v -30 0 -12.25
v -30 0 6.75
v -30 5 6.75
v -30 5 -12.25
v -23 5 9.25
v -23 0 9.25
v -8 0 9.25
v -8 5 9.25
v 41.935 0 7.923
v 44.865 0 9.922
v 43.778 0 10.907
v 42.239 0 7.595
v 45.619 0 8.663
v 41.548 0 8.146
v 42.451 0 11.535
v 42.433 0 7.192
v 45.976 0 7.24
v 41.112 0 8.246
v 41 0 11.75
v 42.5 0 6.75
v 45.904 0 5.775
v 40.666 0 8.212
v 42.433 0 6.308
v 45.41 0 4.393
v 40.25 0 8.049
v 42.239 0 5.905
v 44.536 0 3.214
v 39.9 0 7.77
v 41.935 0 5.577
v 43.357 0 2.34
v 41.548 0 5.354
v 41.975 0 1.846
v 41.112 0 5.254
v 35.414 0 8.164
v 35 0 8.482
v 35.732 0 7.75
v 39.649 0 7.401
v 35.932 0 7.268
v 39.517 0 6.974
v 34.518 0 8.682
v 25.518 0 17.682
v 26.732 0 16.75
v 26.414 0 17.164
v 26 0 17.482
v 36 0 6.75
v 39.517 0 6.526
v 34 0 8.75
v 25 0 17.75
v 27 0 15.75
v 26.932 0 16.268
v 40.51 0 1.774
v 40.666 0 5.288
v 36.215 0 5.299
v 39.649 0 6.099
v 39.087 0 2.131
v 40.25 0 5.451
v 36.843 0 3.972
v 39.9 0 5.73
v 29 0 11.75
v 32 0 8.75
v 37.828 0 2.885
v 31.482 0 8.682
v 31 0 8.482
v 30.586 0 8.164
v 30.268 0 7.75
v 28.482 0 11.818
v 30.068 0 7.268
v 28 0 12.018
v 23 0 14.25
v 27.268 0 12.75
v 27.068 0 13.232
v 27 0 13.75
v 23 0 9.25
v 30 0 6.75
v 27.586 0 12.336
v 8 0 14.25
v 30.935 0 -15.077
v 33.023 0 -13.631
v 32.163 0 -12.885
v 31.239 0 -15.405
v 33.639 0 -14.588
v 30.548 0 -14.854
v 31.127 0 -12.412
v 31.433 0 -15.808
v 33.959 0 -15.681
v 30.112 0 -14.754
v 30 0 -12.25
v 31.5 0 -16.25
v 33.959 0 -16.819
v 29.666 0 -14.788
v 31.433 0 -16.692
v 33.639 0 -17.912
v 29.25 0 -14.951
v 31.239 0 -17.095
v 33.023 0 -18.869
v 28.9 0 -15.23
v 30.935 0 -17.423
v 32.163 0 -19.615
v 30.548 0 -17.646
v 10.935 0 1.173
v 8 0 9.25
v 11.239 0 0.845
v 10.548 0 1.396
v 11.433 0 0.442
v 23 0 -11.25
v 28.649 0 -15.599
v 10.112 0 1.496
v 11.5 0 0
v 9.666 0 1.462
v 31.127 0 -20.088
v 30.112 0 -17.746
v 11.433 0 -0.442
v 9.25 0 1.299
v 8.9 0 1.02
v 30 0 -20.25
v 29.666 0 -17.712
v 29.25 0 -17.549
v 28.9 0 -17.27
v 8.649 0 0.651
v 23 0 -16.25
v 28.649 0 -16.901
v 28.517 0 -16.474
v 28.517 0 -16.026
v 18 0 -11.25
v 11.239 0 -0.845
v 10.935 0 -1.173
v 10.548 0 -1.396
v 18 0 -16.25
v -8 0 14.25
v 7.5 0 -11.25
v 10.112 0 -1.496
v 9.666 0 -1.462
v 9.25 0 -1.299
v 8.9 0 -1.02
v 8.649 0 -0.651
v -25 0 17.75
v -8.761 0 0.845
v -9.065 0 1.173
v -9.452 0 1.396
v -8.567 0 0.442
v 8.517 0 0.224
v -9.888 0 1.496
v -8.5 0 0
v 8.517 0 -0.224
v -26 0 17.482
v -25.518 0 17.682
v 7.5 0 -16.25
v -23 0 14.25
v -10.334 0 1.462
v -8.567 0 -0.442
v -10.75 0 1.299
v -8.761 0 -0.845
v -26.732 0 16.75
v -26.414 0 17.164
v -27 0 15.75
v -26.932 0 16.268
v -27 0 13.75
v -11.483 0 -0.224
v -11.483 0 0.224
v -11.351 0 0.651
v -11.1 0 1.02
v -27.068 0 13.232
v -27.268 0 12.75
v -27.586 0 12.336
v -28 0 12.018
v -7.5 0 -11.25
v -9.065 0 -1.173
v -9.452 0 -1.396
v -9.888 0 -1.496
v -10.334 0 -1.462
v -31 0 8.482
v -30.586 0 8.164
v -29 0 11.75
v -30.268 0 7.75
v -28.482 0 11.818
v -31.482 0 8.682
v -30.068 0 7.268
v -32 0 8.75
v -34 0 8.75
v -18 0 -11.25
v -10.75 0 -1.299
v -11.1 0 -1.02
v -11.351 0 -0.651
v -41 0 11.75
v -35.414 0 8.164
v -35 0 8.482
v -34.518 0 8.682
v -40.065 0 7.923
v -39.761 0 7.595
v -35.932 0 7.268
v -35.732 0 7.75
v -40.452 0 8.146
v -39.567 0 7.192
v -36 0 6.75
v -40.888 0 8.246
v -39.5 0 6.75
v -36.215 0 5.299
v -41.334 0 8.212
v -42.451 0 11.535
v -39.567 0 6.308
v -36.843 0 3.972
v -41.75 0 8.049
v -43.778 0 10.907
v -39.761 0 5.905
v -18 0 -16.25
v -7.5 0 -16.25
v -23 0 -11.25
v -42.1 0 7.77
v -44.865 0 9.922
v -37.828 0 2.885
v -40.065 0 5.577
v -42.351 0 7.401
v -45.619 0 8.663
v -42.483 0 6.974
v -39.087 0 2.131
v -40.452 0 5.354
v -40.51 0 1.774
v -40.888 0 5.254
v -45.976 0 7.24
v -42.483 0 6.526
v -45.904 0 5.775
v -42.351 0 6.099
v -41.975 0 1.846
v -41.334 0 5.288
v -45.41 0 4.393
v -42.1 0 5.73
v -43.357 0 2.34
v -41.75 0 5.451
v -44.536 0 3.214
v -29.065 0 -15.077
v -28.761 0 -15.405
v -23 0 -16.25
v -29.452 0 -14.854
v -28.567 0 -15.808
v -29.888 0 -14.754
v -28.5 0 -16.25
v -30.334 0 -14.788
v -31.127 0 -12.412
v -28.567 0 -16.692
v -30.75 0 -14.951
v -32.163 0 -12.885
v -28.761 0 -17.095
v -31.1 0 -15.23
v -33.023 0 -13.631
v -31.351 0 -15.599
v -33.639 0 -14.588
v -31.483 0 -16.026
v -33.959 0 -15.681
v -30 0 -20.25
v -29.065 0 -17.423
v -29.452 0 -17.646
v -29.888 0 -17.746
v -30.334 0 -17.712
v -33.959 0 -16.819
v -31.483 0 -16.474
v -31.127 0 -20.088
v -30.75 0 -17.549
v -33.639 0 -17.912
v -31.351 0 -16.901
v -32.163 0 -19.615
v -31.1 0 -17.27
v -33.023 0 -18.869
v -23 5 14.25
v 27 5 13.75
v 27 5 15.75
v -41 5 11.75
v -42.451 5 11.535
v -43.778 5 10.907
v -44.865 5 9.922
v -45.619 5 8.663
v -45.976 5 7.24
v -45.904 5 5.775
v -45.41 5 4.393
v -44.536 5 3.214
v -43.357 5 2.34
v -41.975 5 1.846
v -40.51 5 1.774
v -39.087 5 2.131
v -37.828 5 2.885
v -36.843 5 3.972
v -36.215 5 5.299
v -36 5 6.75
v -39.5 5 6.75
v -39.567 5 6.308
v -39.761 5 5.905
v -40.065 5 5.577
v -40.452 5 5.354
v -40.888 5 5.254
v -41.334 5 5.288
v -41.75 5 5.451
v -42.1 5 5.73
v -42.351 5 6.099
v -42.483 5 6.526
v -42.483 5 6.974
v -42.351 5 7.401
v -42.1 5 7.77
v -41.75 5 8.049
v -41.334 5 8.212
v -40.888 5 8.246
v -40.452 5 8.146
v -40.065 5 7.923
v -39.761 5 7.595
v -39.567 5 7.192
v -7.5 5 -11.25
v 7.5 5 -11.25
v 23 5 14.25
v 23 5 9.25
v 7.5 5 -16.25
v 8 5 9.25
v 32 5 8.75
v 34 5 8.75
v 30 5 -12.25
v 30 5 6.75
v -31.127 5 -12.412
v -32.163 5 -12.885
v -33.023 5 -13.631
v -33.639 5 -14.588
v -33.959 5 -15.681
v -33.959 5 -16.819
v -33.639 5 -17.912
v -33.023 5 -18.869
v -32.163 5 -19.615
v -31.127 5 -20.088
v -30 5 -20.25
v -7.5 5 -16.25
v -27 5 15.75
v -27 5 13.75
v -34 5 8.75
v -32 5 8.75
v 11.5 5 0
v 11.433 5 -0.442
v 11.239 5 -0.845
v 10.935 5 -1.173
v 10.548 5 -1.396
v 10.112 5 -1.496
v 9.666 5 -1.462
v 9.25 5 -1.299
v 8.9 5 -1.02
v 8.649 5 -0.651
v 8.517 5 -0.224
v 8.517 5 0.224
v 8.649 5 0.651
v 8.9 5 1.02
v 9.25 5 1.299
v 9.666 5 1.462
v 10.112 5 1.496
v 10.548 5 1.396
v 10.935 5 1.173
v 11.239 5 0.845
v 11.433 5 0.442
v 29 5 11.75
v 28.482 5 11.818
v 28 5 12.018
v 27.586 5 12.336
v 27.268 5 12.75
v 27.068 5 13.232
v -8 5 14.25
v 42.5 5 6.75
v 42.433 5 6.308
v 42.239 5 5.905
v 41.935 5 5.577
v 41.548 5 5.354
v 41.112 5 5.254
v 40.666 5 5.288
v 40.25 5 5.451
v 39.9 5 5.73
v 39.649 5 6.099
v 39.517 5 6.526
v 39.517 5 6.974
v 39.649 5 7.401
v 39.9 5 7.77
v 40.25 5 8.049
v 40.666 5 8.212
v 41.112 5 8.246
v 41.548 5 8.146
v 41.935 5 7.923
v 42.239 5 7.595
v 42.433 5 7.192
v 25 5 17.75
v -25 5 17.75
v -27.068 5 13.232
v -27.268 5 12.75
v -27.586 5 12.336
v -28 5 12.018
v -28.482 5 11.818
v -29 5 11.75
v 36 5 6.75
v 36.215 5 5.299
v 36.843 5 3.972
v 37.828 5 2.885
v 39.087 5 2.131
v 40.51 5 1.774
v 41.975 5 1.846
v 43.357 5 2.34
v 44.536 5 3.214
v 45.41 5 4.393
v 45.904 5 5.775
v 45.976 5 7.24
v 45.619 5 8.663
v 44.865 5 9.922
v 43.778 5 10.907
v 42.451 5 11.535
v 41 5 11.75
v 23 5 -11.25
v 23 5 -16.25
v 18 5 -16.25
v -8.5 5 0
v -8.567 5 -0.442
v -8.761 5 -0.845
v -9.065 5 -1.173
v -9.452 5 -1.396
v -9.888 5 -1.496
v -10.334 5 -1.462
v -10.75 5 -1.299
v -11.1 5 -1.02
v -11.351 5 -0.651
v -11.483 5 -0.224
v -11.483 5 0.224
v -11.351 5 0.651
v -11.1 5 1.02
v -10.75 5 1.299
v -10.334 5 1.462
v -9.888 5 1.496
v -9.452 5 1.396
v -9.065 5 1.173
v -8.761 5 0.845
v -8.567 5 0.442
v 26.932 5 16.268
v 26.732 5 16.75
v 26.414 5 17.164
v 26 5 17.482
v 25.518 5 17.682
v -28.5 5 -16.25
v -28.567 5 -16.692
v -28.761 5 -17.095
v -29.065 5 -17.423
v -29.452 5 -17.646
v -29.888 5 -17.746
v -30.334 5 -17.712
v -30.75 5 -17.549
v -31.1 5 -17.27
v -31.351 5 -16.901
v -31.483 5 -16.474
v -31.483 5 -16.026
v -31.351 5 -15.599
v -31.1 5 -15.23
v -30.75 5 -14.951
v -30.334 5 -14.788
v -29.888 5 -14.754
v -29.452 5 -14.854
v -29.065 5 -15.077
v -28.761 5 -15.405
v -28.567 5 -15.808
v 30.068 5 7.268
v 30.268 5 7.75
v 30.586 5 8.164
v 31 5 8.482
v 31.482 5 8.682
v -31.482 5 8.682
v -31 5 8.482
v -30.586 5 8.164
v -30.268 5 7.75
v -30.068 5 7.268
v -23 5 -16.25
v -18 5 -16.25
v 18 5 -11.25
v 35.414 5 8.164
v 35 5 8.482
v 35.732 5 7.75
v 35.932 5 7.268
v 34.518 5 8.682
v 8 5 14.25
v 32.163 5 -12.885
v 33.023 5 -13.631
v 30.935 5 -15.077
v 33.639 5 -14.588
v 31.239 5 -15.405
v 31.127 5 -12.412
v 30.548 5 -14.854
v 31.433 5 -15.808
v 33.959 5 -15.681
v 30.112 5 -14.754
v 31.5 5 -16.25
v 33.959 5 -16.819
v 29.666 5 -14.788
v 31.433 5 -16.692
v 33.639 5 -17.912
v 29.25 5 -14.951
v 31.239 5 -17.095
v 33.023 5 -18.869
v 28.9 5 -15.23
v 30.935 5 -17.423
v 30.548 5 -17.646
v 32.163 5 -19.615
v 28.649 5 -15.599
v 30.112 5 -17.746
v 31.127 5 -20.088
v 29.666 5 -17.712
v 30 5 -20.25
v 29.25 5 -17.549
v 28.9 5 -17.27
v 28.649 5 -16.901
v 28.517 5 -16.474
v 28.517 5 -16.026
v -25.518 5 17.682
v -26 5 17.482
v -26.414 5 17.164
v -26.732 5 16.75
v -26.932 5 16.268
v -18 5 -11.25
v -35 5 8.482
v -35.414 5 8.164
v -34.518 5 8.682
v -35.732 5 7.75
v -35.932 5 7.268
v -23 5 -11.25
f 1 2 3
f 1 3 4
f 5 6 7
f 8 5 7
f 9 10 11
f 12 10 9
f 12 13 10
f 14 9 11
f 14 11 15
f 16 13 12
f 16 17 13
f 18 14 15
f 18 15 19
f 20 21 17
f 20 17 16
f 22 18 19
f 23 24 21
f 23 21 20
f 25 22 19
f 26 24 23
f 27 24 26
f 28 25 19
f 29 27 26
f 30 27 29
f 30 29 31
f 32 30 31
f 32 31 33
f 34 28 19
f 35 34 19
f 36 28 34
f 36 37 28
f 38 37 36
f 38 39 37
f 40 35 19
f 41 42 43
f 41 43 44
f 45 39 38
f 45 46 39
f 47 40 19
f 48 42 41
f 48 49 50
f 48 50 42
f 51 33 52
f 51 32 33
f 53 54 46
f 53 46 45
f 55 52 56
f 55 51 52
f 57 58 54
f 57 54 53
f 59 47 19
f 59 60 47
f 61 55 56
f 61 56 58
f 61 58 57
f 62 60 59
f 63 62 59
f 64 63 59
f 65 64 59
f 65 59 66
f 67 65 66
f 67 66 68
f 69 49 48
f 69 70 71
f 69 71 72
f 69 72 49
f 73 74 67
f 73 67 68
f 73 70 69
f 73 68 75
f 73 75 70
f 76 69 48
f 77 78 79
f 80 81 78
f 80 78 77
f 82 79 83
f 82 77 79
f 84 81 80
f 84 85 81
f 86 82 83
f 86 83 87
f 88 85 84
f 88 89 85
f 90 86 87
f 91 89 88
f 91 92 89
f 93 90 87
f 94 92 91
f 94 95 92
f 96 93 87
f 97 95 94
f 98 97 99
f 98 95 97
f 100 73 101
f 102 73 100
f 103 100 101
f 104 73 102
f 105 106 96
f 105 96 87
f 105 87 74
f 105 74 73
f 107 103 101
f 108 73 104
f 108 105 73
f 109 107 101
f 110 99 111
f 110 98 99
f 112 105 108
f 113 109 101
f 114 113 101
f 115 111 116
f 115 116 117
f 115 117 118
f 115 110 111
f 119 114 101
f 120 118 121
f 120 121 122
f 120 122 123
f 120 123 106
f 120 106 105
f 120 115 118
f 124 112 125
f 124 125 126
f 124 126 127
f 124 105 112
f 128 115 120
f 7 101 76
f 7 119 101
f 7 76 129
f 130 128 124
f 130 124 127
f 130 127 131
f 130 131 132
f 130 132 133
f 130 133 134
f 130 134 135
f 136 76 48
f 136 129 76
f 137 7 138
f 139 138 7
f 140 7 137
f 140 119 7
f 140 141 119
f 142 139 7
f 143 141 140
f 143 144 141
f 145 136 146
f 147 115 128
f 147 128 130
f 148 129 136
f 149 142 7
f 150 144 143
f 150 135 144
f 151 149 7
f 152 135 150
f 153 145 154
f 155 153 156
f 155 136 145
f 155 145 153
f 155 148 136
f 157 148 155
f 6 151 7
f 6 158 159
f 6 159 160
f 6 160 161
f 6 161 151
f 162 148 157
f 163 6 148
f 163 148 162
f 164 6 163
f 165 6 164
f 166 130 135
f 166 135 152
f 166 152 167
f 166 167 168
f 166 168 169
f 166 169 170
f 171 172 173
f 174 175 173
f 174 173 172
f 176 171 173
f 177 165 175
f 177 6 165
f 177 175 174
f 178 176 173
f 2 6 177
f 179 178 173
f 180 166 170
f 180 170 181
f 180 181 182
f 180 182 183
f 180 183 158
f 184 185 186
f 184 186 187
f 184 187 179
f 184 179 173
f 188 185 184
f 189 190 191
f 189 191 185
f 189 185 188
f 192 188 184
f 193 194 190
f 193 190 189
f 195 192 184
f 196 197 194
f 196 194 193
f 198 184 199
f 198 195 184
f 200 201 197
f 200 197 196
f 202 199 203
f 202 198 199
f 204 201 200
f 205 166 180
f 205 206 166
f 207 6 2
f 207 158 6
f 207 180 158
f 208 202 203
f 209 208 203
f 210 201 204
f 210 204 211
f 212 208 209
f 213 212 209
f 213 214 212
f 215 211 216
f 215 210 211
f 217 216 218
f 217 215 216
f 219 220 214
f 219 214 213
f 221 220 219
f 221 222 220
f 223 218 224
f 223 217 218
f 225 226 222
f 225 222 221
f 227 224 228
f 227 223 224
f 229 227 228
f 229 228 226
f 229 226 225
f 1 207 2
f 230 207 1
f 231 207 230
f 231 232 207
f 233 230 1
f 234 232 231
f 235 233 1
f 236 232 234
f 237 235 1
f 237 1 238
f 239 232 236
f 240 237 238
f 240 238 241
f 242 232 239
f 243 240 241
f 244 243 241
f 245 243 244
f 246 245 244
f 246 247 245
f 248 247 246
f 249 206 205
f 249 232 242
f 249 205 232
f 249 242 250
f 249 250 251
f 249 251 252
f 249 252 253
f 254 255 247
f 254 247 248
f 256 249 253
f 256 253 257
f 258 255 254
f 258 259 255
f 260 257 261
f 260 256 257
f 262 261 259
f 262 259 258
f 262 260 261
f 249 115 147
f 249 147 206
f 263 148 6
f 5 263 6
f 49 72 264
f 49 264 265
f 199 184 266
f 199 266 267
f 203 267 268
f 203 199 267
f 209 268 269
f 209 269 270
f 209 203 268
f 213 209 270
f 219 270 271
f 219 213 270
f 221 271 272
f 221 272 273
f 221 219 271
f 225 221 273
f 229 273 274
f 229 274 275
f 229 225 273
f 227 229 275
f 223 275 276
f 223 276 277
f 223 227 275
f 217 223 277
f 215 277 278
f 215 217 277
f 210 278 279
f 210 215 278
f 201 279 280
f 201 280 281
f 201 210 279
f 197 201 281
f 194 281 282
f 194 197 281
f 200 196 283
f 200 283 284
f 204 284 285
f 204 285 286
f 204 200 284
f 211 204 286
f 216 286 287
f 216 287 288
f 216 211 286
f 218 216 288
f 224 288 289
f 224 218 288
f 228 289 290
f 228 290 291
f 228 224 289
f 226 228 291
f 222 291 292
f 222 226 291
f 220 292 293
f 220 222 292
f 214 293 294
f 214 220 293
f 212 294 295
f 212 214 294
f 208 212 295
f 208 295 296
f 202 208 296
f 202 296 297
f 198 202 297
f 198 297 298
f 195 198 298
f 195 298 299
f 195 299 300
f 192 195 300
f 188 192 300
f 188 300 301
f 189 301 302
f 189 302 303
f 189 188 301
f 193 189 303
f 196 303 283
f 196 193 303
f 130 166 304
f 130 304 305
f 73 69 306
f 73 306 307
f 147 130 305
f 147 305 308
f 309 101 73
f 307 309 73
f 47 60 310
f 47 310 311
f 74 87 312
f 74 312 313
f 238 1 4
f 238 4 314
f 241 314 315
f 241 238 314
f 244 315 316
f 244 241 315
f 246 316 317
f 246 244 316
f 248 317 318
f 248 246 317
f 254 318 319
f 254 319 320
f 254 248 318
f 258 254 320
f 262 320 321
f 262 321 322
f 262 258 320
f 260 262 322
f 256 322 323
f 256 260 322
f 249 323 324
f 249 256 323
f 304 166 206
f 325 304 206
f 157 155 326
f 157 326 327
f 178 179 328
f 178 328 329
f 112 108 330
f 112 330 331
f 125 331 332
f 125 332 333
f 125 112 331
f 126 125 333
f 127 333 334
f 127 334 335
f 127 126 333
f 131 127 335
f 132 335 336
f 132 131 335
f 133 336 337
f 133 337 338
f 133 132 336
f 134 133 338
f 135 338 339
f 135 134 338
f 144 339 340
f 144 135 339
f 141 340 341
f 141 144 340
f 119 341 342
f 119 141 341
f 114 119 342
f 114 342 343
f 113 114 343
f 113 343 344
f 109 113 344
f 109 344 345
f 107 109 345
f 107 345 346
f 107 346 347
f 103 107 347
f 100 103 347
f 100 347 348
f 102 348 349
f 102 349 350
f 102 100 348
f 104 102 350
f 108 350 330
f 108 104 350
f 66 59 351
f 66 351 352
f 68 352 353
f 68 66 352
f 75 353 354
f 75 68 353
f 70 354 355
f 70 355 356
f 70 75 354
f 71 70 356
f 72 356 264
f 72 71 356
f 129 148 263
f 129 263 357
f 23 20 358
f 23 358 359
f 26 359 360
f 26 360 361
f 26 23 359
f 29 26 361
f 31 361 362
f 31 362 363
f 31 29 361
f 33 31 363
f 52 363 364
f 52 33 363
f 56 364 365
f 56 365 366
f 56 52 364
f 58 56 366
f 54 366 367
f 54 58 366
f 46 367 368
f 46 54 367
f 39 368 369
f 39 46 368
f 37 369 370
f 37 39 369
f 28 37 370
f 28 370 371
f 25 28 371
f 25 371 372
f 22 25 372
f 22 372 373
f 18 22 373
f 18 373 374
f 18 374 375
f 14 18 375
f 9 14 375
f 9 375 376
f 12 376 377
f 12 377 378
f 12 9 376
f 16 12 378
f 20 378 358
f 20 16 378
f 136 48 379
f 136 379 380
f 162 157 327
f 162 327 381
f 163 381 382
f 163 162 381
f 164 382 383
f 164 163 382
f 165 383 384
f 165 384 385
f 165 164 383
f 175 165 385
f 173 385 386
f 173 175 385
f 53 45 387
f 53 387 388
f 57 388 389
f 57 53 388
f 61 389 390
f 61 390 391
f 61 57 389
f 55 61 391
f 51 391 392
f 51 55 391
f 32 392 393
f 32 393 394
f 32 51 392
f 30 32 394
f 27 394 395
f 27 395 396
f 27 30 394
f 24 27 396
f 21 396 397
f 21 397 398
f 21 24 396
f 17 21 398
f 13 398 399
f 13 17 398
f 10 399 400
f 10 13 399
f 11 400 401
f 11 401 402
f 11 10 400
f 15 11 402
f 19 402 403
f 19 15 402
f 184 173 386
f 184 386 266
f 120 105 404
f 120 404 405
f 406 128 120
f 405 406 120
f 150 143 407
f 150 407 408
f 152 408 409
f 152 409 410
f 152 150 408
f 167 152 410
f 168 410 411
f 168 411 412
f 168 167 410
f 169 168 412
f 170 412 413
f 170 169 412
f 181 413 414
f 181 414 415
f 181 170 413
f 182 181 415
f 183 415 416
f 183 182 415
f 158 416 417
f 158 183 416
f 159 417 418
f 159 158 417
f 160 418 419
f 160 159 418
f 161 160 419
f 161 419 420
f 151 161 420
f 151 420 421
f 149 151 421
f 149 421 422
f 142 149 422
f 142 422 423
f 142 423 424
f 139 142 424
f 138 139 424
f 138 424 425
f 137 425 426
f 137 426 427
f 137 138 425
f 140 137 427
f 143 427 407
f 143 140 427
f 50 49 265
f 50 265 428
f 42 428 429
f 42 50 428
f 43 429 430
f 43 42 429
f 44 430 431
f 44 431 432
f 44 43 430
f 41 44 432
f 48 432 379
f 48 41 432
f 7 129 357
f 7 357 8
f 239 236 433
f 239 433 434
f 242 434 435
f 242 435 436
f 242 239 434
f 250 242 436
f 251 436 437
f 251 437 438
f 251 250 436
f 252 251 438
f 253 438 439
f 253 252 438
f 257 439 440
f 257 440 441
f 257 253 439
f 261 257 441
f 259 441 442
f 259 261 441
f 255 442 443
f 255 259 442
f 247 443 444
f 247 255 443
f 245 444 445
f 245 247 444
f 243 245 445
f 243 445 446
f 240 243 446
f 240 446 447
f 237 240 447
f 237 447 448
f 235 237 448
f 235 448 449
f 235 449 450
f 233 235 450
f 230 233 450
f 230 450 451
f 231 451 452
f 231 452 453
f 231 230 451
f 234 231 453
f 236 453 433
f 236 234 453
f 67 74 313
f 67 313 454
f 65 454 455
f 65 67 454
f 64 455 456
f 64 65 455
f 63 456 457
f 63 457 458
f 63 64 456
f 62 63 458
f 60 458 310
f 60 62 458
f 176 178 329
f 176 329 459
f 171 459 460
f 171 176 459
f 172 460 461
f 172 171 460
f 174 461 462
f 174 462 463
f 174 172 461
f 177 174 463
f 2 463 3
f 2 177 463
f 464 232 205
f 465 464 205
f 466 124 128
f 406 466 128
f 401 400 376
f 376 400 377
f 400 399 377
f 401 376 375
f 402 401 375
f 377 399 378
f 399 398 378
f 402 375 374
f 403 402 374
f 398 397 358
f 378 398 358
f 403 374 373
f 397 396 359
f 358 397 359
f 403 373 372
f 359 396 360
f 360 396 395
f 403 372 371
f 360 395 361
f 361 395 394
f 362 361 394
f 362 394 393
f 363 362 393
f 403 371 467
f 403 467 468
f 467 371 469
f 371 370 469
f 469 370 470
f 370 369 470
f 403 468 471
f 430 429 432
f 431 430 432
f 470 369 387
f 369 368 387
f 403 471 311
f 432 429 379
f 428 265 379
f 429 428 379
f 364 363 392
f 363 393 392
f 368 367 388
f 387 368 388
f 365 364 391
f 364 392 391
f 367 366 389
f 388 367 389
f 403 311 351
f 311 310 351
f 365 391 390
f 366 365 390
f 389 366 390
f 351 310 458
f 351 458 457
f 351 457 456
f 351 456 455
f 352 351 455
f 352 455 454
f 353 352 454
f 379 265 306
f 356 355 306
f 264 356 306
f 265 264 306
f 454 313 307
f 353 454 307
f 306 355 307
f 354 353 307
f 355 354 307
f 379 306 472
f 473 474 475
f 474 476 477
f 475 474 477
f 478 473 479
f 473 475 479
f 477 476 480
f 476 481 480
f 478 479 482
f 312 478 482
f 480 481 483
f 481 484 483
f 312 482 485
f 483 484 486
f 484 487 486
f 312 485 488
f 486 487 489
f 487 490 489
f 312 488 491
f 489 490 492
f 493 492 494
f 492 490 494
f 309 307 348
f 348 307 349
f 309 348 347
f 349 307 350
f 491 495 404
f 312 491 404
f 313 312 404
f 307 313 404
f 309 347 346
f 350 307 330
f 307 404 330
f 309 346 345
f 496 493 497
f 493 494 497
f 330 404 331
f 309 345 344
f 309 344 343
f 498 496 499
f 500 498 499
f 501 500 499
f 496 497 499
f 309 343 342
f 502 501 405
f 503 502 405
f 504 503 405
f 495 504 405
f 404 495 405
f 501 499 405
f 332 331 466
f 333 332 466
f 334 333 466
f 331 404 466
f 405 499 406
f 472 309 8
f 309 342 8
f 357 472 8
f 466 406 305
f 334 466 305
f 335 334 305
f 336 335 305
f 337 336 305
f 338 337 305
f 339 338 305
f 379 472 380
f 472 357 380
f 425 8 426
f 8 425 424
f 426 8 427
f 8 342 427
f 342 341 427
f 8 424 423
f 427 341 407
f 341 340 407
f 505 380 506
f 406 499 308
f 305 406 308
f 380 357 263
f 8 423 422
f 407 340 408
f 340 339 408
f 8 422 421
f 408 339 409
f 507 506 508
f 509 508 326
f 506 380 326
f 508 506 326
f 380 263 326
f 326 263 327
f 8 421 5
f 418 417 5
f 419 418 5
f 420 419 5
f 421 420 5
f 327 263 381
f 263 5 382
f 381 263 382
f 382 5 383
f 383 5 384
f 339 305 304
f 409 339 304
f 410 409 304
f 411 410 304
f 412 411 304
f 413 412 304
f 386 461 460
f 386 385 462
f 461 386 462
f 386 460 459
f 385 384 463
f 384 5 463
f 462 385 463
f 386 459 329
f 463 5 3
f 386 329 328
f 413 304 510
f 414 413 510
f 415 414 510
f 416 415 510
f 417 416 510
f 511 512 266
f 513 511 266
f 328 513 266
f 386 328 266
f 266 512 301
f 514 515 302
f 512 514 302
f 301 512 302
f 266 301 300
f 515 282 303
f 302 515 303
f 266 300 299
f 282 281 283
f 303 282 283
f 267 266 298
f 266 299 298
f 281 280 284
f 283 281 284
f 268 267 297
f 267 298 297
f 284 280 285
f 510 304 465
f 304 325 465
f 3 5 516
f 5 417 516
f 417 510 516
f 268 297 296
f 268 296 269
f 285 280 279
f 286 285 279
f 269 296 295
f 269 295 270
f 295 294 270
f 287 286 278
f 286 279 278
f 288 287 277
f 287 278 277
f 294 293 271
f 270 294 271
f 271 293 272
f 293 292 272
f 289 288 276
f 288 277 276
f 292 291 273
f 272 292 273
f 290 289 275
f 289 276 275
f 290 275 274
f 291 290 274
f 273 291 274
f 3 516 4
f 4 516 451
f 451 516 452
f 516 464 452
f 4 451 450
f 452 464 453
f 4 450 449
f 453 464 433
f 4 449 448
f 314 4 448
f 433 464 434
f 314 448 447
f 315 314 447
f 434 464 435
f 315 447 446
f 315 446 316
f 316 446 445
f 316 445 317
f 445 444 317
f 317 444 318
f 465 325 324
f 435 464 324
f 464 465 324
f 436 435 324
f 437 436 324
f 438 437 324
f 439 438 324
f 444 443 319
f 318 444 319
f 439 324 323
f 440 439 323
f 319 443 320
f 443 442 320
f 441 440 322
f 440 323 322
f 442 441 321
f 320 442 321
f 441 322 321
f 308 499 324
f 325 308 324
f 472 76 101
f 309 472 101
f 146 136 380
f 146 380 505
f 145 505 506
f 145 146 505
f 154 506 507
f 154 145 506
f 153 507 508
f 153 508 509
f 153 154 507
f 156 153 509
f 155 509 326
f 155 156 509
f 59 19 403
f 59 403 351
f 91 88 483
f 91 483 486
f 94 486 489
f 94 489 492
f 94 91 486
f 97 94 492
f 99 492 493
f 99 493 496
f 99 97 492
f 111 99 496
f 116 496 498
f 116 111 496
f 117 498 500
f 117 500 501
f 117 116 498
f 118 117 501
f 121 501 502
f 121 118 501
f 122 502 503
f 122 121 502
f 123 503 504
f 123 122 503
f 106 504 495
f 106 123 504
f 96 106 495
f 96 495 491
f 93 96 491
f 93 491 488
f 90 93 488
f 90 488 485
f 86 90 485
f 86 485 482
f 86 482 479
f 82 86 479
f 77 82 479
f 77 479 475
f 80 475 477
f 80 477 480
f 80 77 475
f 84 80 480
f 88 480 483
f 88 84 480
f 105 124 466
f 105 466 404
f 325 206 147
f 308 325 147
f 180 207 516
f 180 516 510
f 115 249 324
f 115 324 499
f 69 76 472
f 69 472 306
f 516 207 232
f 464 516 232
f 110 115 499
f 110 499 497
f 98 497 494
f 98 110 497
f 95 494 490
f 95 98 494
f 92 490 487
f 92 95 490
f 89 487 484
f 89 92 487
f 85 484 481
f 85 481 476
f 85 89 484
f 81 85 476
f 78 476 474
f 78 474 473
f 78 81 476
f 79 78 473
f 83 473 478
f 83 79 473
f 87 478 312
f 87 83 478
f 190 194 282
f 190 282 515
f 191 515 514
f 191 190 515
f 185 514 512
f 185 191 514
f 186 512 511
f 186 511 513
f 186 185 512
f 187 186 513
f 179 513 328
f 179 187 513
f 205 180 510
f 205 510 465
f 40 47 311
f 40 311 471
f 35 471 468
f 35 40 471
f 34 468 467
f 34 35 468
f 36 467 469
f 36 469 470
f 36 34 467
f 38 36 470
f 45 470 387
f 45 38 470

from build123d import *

# Parameters (mm, degrees)
SKETCH1_R           = 1.5
SKETCH1_W           = 5
SKETCH1_H           = 5
SKETCH1_W_2         = 15
BOSS_EXTRUDE1_DEPTH = 5


with BuildPart() as part:
    # Sketch1 → Boss-Extrude1 (new body)
    with BuildSketch(Plane(origin=(0, 0, 0), x_dir=(1, 0, 0), z_dir=(0, 1, 0))):
        with BuildLine():
            Line((-29, -11.75), (-30, -11.75))
            Line((-30, -11.75), (-41, -11.75))
            ThreePointArc((-41, -11.75), (-44.535533906, -3.214466094), (-36, -6.75))
            ThreePointArc((-36, -6.75), (-35.414213562, -8.164213562), (-34, -8.75))
            Line((-34, -8.75), (-32, -8.75))
            ThreePointArc((-32, -8.75), (-30.585786438, -8.164213562), (-30, -6.75))
            Line((-30, -6.75), (-30, 12.25))
            ThreePointArc((-30, 12.25), (-34, 16.25), (-30, 20.25))
            Line((-30, 20.25), (30, 20.25))
            ThreePointArc((30, 20.25), (34, 16.25), (30, 12.25))
            Line((30, 12.25), (30, -6.75))
            ThreePointArc((30, -6.75), (30.585786438, -8.164213562), (32, -8.75))
            Line((32, -8.75), (34, -8.75))
            ThreePointArc((34, -8.75), (35.414213562, -8.164213562), (36, -6.75))
            ThreePointArc((36, -6.75), (44.535533906, -3.214466094), (41, -11.75))
            Line((41, -11.75), (30, -11.75))
            Line((30, -11.75), (29, -11.75))
            ThreePointArc((29, -11.75), (27.585786438, -12.335786438), (27, -13.75))
            Line((27, -13.75), (27, -15.75))
            ThreePointArc((27, -15.75), (26.414213562, -17.164213562), (25, -17.75))
            Line((25, -17.75), (-25, -17.75))
            ThreePointArc((-25, -17.75), (-26.414213562, -17.164213562), (-27, -15.75))
            Line((-27, -15.75), (-27, -13.75))
            ThreePointArc((-27, -13.75), (-27.585786438, -12.335786438), (-29, -11.75))
        make_face()
        with Locations((-10, 0)):
            Circle(SKETCH1_R, mode=Mode.SUBTRACT)
        with Locations((10, 0)):
            Circle(SKETCH1_R, mode=Mode.SUBTRACT)
        with Locations((-30, 16.25)):
            Circle(SKETCH1_R, mode=Mode.SUBTRACT)
        with Locations((30, 16.25)):
            Circle(SKETCH1_R, mode=Mode.SUBTRACT)
        with Locations((41, -6.75)):
            Circle(SKETCH1_R, mode=Mode.SUBTRACT)
        with Locations((-41, -6.75)):
            Circle(SKETCH1_R, mode=Mode.SUBTRACT)
        with Locations((-20.5, 13.75)):
            Rectangle(SKETCH1_W, SKETCH1_H, mode=Mode.SUBTRACT)
        with Locations((0, 13.75)):
            Rectangle(SKETCH1_W_2, SKETCH1_H, mode=Mode.SUBTRACT)
        with Locations((20.5, 13.75)):
            Rectangle(SKETCH1_W, SKETCH1_H, mode=Mode.SUBTRACT)
        with Locations((-15.5, -11.75)):
            Rectangle(SKETCH1_W_2, SKETCH1_H, mode=Mode.SUBTRACT)
        with Locations((15.5, -11.75)):
            Rectangle(SKETCH1_W_2, SKETCH1_H, mode=Mode.SUBTRACT)
    extrude(amount=BOSS_EXTRUDE1_DEPTH)


solid = part.part
